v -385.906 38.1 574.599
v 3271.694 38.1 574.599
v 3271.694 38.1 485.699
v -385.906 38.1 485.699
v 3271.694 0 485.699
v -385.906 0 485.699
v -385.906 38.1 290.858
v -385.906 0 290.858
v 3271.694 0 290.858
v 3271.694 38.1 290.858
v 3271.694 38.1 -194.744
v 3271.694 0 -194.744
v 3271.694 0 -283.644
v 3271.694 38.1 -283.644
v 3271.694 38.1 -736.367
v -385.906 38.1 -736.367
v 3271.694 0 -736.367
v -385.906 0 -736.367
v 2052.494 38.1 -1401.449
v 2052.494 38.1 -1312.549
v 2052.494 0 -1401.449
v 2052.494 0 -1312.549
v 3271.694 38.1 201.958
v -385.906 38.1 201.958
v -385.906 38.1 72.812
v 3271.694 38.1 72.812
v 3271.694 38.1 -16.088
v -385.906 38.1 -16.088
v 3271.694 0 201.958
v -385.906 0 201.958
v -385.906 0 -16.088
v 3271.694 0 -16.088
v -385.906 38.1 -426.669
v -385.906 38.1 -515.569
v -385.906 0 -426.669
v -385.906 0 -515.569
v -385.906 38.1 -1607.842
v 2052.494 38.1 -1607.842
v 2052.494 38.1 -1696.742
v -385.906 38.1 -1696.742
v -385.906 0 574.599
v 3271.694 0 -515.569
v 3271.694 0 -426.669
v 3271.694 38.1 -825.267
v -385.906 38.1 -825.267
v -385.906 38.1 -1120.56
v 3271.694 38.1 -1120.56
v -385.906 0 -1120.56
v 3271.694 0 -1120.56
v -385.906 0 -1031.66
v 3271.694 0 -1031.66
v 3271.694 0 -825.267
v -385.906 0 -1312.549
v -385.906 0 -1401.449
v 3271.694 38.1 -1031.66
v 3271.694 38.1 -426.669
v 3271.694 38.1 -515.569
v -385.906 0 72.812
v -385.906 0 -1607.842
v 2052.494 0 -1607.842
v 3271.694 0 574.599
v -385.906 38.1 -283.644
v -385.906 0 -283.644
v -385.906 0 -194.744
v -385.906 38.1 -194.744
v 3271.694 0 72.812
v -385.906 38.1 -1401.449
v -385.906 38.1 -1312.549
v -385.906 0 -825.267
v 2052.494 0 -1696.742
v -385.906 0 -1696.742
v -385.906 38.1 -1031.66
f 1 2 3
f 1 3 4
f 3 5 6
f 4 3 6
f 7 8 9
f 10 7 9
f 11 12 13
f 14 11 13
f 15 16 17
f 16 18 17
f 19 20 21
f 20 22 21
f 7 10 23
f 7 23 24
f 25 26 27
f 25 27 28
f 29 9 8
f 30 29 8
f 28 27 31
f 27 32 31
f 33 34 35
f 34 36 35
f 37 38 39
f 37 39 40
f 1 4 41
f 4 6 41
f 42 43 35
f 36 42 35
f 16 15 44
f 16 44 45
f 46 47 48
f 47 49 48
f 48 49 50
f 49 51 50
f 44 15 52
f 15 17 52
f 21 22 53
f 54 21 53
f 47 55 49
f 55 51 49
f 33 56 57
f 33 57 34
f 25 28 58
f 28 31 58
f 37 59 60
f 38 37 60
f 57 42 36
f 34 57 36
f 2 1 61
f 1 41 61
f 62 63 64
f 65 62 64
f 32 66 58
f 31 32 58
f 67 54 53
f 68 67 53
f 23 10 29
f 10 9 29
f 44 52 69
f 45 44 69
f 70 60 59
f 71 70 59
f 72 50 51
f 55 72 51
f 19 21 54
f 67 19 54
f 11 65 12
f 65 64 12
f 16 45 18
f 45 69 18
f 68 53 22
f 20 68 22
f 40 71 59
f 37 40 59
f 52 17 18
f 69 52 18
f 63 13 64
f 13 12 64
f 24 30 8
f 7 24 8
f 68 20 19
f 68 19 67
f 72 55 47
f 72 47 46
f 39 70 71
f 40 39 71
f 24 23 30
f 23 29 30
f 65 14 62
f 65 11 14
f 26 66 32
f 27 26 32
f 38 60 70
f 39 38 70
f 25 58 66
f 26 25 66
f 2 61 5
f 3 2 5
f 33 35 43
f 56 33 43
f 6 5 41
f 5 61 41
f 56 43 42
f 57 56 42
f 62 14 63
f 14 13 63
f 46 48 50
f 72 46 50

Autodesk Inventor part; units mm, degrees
ref_plane "YZ Plane" through (0, 0, 0) normal (1, 0, 0) x (0, 1, 0)
ref_plane "XZ Plane" through (0, 0, 0) normal (0, 1, 0) x (-1, 0, 0)
ref_plane "XY Plane" through (0, 0, 0) normal (0, 0, 1) x (1, 0, 0)
sketch "Sketch1" plane through (0, 0, 0) normal (0, 1, 0) x (-1, 0, 0)
  line L0 (385.9062, 574.5992) -> (-3271.6938, 574.5992)
  line L1 (-3271.6938, 574.5992) -> (-3271.6938, 485.6992)
  line L2 (-3271.6938, 485.6992) -> (385.9062, 485.6992)
  line L3 (385.9062, 485.6992) -> (385.9062, 574.5992)
  line L4 (385.9062, 290.8577) -> (-3271.6938, 290.8577)
  line L5 (-3271.6938, 290.8577) -> (-3271.6938, 201.9577)
  line L6 (-3271.6938, 201.9577) -> (385.9062, 201.9577)
  line L7 (385.9062, 201.9577) -> (385.9062, 290.8577)
  line L8 (385.9062, 72.812) -> (-3271.6938, 72.812)
  line L9 (-3271.6938, 72.812) -> (-3271.6938, -16.088)
  line L10 (-3271.6938, -16.088) -> (385.9062, -16.088)
  line L11 (385.9062, -16.088) -> (385.9062, 72.812)
  line L12 (385.9062, -194.7435) -> (-3271.6938, -194.7435)
  line L13 (-3271.6938, -194.7435) -> (-3271.6938, -283.6435)
  line L14 (-3271.6938, -283.6435) -> (385.9062, -283.6435)
  line L15 (385.9062, -283.6435) -> (385.9062, -194.7435)
  line L16 (385.9062, -426.6687) -> (-3271.6938, -426.6687)
  line L17 (-3271.6938, -426.6687) -> (-3271.6938, -515.5687)
  line L18 (-3271.6938, -515.5687) -> (385.9062, -515.5687)
  line L19 (385.9062, -515.5687) -> (385.9062, -426.6687)
  line L20 (385.9062, -736.3666) -> (-3271.6938, -736.3666)
  line L21 (-3271.6938, -736.3666) -> (-3271.6938, -825.2666)
  line L22 (-3271.6938, -825.2666) -> (385.9062, -825.2666)
  line L23 (385.9062, -825.2666) -> (385.9062, -736.3666)
  line L24 (385.9062, -1031.6599) -> (-3271.6938, -1031.6599)
  line L25 (-3271.6938, -1031.6599) -> (-3271.6938, -1120.5599)
  line L26 (-3271.6938, -1120.5599) -> (385.9062, -1120.5599)
  line L27 (385.9062, -1120.5599) -> (385.9062, -1031.6599)
  line L28 (385.9062, -1312.5487) -> (-2052.4938, -1312.5487)
  line L29 (-2052.4938, -1312.5487) -> (-2052.4938, -1401.4487)
  line L30 (-2052.4938, -1401.4487) -> (385.9062, -1401.4487)
  line L31 (385.9062, -1401.4487) -> (385.9062, -1312.5487)
  line L32 (385.9062, -1607.8421) -> (-2052.4938, -1607.8421)
  line L33 (-2052.4938, -1607.8421) -> (-2052.4938, -1696.7421)
  line L34 (-2052.4938, -1696.7421) -> (385.9062, -1696.7421)
  line L35 (385.9062, -1696.7421) -> (385.9062, -1607.8421)
  point P0 (0, 0)
extrude "Extrusion1" add sketch "Sketch1" along normal blind 38.1
sketch "Sketch2" plane through (0, 38.1, 0) normal (0, 1, 0) x (1, 0, 0)
  line L0 (-385.9062, -574.5992) -> (3271.6938, -574.5992) projected
  line L1 (3271.6938, -485.6992) -> (-385.9062, -485.6992) projected
  line L2 (-385.9062, -574.5992) -> (655.4938, -574.5992)
  line L3 (655.4938, -574.5992) -> (655.4938, -485.6992)
  line L4 (655.4938, -485.6992) -> (-385.9062, -485.6992)
  line L5 (-385.9062, -485.6992) -> (-385.9062, -574.5992)
  line L6 (655.4938, -574.5992) -> (1696.8938, -574.5992)
  line L7 (1696.8938, -574.5992) -> (1696.8938, -485.6992)
  line L8 (1696.8938, -485.6992) -> (655.4938, -485.6992)
  line L9 (655.4938, -485.6992) -> (655.4938, -574.5992)
  line L10 (1696.8938, -574.5992) -> (2738.2938, -574.5992)
  line L11 (2738.2938, -574.5992) -> (2738.2938, -485.6992)
  line L12 (2738.2938, -485.6992) -> (1696.8938, -485.6992)
  line L13 (1696.8938, -485.6992) -> (1696.8938, -574.5992)
  line L14 (2738.2938, -574.5992) -> (3195.4938, -574.5992)
  line L15 (3195.4938, -574.5992) -> (3195.4938, -485.6992)
  line L16 (3195.4938, -485.6992) -> (2738.2938, -485.6992)
  line L17 (2738.2938, -485.6992) -> (2738.2938, -574.5992)
  point P0 (0, 0)
  dimension "d14" = 1041.4
  dimension "d15" = 1041.4
  dimension "d16" = 1041.4
  dimension "d17" = 457.2
sketch "Sketch3" plane through (0, 38.1, 0) normal (0, 1, 0) x (1, 0, 0)
  point P0 (0, 0)
sketch "Sketch4" plane through (0, 38.1, 0) normal (0, 1, 0) x (1, 0, 0)
  line L0 (-385.9062, 1312.5487) -> (2052.4938, 1312.5487) projected
  line L1 (-385.9062, 1312.5487) -> (833.2938, 1312.5487)
  line L2 (833.2938, 1312.5487) -> (744.3938, 1312.5487)
  line L3 (833.2938, 1312.5487) -> (833.2938, 1401.4487)
  line L4 (2052.4938, 1401.4487) -> (-385.9062, 1401.4487) projected
  line L5 (-385.9062, 1607.8421) -> (2052.4938, 1607.8421) projected
  line L6 (2052.4938, 1696.7421) -> (-385.9062, 1696.7421) projected
  line L7 (-385.9062, 1607.8421) -> (833.2938, 1607.8421)
  line L8 (833.2938, 1607.8421) -> (833.2938, 1696.7421)
  line L9 (833.2938, 1696.7421) -> (-385.9062, 1696.7421)
  line L10 (-385.9062, 1696.7421) -> (-385.9062, 1607.8421)
  line L11 (1180.5013, 1687.0985) -> (2076.0674, 1687.0985) construction
  line L12 (2076.0674, 1687.0985) -> (2076.0674, 1614.1334) construction
  line L13 (2076.0674, 1614.1334) -> (1180.5013, 1614.1334) construction
  line L14 (1180.5013, 1614.1334) -> (1180.5013, 1687.0985) construction
  point P0 (0, 0)
  dimension "d20" = 1219.2
  dimension "d21" = 1219.2
  dimension "d22" = 1219.2
sketch "Sketch5" plane through (0, 38.1, 0) normal (0, 1, 0) x (1, 0, 0)
  line L0 (-385.9062, -290.8577) -> (3271.6938, -290.8577) projected
  line L1 (3271.6938, -201.9577) -> (-385.9062, -201.9577) projected
  line L2 (-385.9062, -290.8577) -> (1315.8938, -290.8577)
  line L3 (1315.8938, -201.9577) -> (-385.9062, -201.9577)
  line L4 (-385.9062, -201.9577) -> (-385.9062, -290.8577)
  line L5 (-385.9062, -290.8577) -> (160.1938, -290.8577)
  line L6 (160.1938, -290.8577) -> (160.1938, -201.9577)
  line L7 (160.1938, -201.9577) -> (-385.9062, -201.9577)
  line L8 (-385.9062, -201.9577) -> (-385.9062, -290.8577)
  line L9 (160.1938, -290.8577) -> (680.8938, -290.8577)
  line L10 (680.8938, -290.8577) -> (680.8938, -201.9577)
  line L11 (680.8938, -201.9577) -> (160.1938, -201.9577)
  line L12 (160.1938, -201.9577) -> (160.1938, -290.8577)
  line L13 (932.1842, -223.6309) -> (1676.0985, -223.6309) construction
  line L14 (1676.0985, -223.6309) -> (1676.0985, -290.8577) construction
  line L15 (1676.0985, -290.8577) -> (932.1842, -290.8577) construction
  line L16 (932.1842, -290.8577) -> (932.1842, -223.6309) construction
  line L17 (3271.6938, 16.088) -> (-385.9062, 16.088) projected
  line L18 (-385.9062, -72.812) -> (833.2938, -72.812)
  line L19 (833.2938, -72.812) -> (833.2938, 16.088)
  line L20 (833.2938, 16.088) -> (-385.9062, 16.088)
  line L21 (-385.9062, 16.088) -> (-385.9062, -72.812)
  line L22 (833.2938, -72.812) -> (1442.8938, -72.812)
  line L23 (1442.8938, -72.812) -> (1442.8938, 16.088)
  line L24 (1442.8938, 16.088) -> (833.2938, 16.088)
  line L25 (833.2938, 16.088) -> (833.2938, -72.812)
  line L26 (1670.5598, 2.7748) -> (2044.3097, 2.7748) construction
  line L27 (2044.3097, 2.7748) -> (2044.3097, -71.9751) construction
  line L28 (2044.3097, -71.9751) -> (1670.5598, -71.9751) construction
  line L29 (1670.5598, -71.9751) -> (1670.5598, 2.7748) construction
  line L30 (1674.5456, 270.567) -> (2048.2955, 270.567) construction
  line L31 (2048.2955, 270.567) -> (2048.2955, 195.8171) construction
  line L32 (2048.2955, 195.8171) -> (1674.5456, 195.8171) construction
  line L33 (1674.5456, 195.8171) -> (1674.5456, 270.567) construction
  line L34 (-385.9062, 283.6435) -> (-385.9062, 194.7435) projected
  line L35 (3271.6938, 283.6435) -> (-385.9062, 283.6435) projected
  line L36 (-385.9062, 194.7435) -> (833.2938, 194.7435)
  line L37 (833.2938, 194.7435) -> (833.2938, 283.6435)
  line L38 (833.2938, 283.6435) -> (-385.9062, 283.6435)
  line L39 (-385.9062, 283.6435) -> (-385.9062, 194.7435)
  line L40 (3271.6938, 515.5687) -> (-385.9062, 515.5687) projected
  line L41 (-385.9062, 426.6687) -> (655.4938, 426.6687)
  line L42 (655.4938, 426.6687) -> (655.4938, 515.5687)
  line L43 (655.4938, 515.5687) -> (-385.9062, 515.5687)
  line L44 (-385.9062, 515.5687) -> (-385.9062, 426.6687)
  line L45 (1112.7606, 503.511) -> (1856.6748, 503.511) construction
  line L46 (1856.6748, 503.511) -> (1856.6748, 436.2841) construction
  line L47 (1856.6748, 436.2841) -> (1112.7606, 436.2841) construction
  line L48 (1112.7606, 436.2841) -> (1112.7606, 503.511) construction
  line L49 (3271.6938, 825.2666) -> (-385.9062, 825.2666) projected
  line L50 (-385.9062, 736.3666) -> (833.2938, 736.3666)
  line L51 (833.2938, 736.3666) -> (833.2938, 825.2666)
  line L52 (833.2938, 825.2666) -> (-385.9062, 825.2666)
  line L53 (-385.9062, 825.2666) -> (-385.9062, 736.3666)
  line L54 (833.2938, 736.3666) -> (2052.4938, 736.3666)
  line L55 (2052.4938, 736.3666) -> (2052.4938, 825.2666)
  line L56 (2052.4938, 825.2666) -> (833.2938, 825.2666)
  line L57 (833.2938, 825.2666) -> (833.2938, 736.3666)
  line L58 (2052.4938, 736.3666) -> (3271.6938, 736.3666)
  line L59 (3271.6938, 736.3666) -> (3271.6938, 825.2666)
  line L60 (3271.6938, 825.2666) -> (2052.4938, 825.2666)
  line L61 (2052.4938, 825.2666) -> (2052.4938, 736.3666)
  line L62 (3271.6938, 1031.6599) -> (3271.6938, 1120.5599) projected
  line L63 (-385.9062, 1031.6599) -> (3271.6938, 1031.6599) projected
  line L64 (3271.6938, 1120.5599) -> (2052.4938, 1120.5599)
  line L65 (2052.4938, 1120.5599) -> (2052.4938, 1031.6599)
  line L66 (2052.4938, 1031.6599) -> (3271.6938, 1031.6599)
  line L67 (3271.6938, 1031.6599) -> (3271.6938, 1120.5599)
  line L68 (2052.4938, 1120.5599) -> (833.2938, 1120.5599)
  line L69 (833.2938, 1120.5599) -> (833.2938, 1031.6599)
  line L70 (833.2938, 1031.6599) -> (2052.4938, 1031.6599)
  line L71 (2052.4938, 1031.6599) -> (2052.4938, 1120.5599)
  line L72 (833.2938, 1031.6599) -> (-385.9062, 1031.6599)
  line L73 (-385.9062, 1031.6599) -> (-385.9062, 1120.5599)
  line L74 (-385.9062, 1120.5599) -> (833.2938, 1120.5599)
  line L75 (833.2938, 1120.5599) -> (833.2938, 1031.6599)
  line L76 (833.2938, 194.7435) -> (1423.8438, 194.7435)
  line L77 (1423.8438, 194.7435) -> (1423.8438, 283.6435)
  line L78 (1423.8438, 283.6435) -> (833.2938, 283.6435)
  line L79 (833.2938, 283.6435) -> (833.2938, 194.7435)
  point P0 (1278.9754, 436.2841)
  dimension "d24" = 546.1
  dimension "d25" = 520.7
  dimension "d27" = 1219.2
  dimension "d28" = 609.6
  dimension "d29" = 1219.2
  dimension "d30" = 1041.4
  dimension "d31" = 1219.2
  dimension "d32" = 1219.2
  dimension "d33" = 1219.2
  dimension "d34" = 1219.2
  dimension "d35" = 1219.2
  dimension "d36" = 1219.2
  dimension "d37" = 590.55
properties part number "Lshoulder cuts"
